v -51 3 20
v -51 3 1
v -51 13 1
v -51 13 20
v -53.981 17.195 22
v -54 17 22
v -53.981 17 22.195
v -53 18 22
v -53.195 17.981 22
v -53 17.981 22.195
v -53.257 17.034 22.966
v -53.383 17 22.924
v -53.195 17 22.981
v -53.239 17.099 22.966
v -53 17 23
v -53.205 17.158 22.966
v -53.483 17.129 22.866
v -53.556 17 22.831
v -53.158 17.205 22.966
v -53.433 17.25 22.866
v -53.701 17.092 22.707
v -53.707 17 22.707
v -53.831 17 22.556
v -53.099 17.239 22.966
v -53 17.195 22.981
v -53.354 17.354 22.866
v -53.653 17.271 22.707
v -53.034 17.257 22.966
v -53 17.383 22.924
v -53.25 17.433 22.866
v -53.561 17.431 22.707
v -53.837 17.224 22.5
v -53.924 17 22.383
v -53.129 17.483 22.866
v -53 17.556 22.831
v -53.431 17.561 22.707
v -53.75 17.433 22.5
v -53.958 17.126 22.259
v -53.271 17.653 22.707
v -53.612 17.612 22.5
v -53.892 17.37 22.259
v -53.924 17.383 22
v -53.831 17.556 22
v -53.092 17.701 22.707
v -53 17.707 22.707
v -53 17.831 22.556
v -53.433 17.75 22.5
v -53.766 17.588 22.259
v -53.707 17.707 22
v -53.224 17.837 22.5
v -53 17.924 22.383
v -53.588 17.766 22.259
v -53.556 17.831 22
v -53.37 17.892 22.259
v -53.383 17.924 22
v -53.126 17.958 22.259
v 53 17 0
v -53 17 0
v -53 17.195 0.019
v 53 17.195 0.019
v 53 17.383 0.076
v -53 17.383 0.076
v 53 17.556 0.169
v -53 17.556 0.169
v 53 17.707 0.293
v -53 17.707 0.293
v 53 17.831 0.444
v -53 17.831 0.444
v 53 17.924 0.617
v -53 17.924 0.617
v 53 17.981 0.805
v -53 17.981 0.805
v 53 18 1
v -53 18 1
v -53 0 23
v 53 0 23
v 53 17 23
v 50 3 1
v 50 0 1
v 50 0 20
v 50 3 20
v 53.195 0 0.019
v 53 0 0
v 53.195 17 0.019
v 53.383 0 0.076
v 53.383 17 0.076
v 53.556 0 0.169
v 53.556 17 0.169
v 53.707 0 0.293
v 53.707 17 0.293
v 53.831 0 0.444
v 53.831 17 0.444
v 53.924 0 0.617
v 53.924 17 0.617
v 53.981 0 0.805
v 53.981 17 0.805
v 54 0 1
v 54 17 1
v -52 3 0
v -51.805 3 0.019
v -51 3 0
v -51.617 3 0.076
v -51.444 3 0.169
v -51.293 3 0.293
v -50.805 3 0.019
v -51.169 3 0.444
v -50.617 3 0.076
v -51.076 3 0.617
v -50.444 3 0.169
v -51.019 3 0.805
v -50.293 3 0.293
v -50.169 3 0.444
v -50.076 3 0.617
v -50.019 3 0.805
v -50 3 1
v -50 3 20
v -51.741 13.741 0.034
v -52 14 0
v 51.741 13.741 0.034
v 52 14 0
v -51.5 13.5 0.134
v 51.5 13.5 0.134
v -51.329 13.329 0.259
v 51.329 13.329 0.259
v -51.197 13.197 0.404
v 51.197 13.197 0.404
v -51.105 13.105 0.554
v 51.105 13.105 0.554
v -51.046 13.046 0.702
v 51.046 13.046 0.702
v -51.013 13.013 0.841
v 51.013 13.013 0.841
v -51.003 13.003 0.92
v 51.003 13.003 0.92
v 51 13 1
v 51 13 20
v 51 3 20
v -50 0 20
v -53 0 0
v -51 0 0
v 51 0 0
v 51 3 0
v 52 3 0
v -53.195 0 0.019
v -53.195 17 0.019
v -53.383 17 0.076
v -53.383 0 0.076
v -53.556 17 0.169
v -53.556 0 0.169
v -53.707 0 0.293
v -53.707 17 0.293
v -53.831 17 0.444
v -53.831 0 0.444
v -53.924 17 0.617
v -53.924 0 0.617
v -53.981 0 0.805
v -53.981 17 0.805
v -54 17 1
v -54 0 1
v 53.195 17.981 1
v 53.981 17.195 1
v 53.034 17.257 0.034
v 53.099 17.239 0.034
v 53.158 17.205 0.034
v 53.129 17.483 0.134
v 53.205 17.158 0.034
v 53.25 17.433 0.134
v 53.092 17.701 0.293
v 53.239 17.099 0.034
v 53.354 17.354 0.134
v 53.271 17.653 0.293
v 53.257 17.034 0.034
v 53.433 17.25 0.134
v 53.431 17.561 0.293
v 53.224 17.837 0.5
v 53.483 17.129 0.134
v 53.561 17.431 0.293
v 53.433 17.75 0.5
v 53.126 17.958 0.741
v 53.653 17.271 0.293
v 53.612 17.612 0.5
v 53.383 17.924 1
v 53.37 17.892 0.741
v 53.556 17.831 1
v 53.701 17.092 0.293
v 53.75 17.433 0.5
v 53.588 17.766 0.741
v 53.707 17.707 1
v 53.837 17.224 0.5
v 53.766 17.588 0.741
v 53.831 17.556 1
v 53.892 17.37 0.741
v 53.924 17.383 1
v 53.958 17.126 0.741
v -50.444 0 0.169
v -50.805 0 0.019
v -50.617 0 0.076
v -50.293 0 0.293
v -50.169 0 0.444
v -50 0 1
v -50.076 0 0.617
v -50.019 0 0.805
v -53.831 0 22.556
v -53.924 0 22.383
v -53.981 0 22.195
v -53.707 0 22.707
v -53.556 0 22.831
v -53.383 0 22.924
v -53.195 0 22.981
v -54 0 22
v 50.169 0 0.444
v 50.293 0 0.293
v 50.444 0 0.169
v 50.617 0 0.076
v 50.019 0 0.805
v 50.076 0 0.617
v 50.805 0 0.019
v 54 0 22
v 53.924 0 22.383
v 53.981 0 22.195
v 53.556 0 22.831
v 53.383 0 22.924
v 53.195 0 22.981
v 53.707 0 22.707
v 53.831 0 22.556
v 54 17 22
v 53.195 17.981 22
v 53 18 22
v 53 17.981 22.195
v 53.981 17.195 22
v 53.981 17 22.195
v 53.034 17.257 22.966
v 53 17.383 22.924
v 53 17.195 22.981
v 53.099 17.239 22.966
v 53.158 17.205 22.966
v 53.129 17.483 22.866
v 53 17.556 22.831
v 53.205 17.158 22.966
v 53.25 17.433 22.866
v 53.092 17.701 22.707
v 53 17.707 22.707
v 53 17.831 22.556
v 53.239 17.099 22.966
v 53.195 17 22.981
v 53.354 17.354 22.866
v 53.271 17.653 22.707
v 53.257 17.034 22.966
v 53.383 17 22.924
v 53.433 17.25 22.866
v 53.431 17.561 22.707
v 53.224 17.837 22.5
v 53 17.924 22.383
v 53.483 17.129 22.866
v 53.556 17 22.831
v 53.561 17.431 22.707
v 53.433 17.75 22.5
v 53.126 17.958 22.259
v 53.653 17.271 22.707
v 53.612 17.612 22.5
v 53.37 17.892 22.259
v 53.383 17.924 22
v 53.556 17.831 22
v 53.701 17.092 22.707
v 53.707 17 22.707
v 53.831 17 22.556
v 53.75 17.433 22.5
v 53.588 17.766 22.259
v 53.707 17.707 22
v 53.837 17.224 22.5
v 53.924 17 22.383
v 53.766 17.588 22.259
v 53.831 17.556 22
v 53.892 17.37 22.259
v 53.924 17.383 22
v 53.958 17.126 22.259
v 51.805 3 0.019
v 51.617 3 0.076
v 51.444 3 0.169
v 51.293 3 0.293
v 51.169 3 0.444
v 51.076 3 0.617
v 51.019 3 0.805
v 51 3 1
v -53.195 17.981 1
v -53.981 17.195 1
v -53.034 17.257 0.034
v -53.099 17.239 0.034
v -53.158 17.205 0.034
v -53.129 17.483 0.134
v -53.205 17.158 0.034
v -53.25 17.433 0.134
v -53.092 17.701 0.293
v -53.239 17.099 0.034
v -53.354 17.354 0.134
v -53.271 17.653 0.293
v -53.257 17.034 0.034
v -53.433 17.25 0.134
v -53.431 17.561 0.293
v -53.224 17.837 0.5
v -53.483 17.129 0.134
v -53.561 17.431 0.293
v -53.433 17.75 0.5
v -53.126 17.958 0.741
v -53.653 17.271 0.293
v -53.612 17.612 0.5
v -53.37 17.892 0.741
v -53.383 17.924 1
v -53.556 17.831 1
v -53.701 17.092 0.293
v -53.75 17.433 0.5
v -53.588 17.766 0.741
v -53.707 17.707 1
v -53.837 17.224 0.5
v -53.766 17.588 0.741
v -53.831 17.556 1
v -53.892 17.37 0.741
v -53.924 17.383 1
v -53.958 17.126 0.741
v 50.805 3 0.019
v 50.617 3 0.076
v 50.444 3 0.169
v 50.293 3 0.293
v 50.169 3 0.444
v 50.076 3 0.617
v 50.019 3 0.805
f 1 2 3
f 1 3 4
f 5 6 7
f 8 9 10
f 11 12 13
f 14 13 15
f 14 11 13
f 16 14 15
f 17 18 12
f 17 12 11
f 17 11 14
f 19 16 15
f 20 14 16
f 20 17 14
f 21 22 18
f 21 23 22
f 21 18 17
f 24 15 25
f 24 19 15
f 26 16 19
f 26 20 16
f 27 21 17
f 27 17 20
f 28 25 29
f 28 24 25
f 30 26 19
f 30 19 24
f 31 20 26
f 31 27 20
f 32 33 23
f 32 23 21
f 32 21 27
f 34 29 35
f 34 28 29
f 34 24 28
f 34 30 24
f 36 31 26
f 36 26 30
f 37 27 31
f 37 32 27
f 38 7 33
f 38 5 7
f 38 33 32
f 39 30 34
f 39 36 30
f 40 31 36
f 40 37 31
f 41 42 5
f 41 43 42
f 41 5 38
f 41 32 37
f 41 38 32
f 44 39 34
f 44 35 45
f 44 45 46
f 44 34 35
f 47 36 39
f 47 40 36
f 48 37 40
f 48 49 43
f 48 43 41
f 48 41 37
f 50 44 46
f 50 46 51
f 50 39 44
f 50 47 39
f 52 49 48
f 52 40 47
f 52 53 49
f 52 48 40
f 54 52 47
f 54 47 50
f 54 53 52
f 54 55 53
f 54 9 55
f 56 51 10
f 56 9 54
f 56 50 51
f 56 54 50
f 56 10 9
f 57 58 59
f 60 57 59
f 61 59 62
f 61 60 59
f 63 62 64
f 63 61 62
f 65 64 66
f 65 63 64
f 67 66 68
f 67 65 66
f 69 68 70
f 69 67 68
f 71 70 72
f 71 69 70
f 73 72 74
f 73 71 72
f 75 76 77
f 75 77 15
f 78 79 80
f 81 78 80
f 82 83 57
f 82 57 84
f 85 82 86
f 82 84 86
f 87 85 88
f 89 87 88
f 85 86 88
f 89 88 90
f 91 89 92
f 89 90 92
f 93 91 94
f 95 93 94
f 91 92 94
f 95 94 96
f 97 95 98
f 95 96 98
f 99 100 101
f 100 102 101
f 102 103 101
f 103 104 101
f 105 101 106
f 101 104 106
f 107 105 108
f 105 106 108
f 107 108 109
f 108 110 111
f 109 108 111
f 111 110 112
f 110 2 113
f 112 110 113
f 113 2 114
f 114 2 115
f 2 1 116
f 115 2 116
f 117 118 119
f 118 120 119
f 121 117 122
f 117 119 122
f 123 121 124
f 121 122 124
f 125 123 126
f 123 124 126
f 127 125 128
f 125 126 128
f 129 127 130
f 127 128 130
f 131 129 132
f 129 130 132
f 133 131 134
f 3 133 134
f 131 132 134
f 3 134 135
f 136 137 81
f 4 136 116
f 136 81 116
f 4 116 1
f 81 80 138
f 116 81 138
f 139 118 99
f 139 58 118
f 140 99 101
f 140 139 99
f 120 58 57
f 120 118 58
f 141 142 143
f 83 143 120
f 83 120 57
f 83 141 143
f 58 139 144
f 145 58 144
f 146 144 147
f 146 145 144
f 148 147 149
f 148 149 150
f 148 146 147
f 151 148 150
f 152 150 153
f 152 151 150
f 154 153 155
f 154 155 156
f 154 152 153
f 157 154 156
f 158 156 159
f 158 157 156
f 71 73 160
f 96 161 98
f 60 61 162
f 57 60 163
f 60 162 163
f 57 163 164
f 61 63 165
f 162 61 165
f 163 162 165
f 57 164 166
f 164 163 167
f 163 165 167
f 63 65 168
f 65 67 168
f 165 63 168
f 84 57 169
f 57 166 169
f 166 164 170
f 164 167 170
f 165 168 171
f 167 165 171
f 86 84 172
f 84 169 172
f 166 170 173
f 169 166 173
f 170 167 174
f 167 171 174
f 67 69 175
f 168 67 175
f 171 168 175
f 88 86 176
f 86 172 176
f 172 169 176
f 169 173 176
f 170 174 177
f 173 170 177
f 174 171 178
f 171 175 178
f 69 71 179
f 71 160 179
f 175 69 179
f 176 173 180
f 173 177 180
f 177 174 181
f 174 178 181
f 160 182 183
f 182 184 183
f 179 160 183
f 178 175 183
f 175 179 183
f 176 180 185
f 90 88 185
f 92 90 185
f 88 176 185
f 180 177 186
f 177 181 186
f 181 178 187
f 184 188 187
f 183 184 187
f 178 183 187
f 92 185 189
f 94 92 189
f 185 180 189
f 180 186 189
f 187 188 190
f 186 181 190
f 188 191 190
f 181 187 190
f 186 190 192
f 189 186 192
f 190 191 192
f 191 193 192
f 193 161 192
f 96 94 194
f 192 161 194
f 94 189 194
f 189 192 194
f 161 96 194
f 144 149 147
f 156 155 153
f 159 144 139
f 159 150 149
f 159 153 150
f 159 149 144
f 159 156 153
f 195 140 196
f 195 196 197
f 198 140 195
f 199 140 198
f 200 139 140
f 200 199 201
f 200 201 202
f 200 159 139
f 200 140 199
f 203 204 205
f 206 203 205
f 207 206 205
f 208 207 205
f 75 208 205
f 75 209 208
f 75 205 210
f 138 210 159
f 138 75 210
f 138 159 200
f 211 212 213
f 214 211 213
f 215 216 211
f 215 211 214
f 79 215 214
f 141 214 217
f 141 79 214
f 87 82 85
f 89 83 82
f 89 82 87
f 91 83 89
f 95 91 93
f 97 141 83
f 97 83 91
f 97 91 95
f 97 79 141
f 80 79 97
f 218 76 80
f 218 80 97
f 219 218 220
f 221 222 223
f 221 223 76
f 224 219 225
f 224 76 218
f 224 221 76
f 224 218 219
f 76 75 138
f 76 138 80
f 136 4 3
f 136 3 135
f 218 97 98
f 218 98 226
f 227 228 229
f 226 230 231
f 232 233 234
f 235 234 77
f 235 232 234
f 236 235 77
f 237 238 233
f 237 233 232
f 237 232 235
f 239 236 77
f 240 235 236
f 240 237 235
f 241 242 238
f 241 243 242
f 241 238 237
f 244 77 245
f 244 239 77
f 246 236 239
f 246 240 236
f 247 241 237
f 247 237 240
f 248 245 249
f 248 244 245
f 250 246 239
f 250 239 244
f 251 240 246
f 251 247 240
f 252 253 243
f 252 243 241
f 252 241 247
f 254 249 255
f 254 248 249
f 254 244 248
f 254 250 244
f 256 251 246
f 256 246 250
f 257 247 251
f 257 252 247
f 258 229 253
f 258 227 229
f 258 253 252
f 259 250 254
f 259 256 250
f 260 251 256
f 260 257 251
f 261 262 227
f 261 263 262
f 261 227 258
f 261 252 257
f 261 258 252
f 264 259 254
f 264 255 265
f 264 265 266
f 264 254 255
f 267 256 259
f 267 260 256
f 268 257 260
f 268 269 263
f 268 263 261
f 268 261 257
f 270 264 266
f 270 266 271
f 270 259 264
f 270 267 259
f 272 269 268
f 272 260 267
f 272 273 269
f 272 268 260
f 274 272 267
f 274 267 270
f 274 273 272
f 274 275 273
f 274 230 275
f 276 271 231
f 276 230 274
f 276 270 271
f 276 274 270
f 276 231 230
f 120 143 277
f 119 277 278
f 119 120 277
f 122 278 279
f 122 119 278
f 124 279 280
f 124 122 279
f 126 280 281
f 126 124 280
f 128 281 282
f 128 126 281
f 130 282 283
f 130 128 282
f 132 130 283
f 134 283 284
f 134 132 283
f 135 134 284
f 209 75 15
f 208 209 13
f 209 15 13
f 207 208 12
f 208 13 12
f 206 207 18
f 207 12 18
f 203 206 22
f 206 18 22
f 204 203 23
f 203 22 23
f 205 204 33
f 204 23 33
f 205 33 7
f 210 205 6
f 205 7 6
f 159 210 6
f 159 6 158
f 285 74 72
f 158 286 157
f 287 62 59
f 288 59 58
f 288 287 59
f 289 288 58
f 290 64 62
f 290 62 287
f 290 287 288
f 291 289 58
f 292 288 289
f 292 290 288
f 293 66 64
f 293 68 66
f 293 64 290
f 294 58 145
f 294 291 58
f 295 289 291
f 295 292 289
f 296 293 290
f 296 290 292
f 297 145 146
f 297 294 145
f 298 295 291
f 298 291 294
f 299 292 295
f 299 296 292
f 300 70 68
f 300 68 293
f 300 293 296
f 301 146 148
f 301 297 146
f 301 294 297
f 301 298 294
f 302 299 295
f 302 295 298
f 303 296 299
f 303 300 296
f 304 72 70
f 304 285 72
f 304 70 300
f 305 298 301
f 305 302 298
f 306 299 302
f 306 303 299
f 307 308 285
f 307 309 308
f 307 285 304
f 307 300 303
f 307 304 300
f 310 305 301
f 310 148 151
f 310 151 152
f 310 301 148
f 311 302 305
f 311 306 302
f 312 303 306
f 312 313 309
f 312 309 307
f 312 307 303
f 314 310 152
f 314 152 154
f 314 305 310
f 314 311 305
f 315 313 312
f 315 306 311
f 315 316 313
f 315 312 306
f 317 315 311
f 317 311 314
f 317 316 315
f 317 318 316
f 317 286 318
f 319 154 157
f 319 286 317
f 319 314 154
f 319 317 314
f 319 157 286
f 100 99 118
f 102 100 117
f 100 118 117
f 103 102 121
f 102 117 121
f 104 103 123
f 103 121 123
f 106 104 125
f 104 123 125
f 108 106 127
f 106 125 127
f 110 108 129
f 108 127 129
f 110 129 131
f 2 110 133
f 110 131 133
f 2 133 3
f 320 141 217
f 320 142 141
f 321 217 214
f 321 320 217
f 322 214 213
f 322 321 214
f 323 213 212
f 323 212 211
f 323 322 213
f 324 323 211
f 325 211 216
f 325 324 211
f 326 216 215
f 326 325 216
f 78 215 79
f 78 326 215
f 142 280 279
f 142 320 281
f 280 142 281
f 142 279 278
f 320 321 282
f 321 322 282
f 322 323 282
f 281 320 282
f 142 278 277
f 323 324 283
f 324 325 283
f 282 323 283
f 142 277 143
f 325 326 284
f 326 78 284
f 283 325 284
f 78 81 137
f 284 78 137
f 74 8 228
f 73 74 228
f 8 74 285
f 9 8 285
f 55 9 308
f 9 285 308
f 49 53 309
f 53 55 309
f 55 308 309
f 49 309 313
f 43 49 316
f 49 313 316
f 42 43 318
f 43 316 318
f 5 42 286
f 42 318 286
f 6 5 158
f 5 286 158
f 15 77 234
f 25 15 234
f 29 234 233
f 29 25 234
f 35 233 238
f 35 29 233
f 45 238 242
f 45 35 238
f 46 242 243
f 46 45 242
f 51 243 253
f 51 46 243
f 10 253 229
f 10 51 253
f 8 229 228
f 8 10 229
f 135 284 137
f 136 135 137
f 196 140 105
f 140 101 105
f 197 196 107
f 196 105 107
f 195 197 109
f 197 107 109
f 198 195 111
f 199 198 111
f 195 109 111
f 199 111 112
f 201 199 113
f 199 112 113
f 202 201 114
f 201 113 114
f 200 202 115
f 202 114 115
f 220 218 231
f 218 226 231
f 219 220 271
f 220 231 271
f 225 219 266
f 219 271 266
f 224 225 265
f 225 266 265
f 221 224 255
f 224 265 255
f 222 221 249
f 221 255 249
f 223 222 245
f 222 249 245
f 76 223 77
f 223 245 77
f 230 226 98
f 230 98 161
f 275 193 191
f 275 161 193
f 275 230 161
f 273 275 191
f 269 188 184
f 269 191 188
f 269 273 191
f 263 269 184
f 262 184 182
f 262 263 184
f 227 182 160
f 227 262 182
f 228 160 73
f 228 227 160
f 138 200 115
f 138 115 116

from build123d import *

# Parameters (mm, degrees)
F0_W     = 1
F0_H     = 20
F0_W_2   = 100
F1_DEPTH = 18
F2_DEPTH = 13
F3_DEPTH = 3
F4_R     = 0.9999


# Not quite as in the source:
# - a fillet or chamfer is up to 0.001 mm smaller than in the source, because OpenCascade refuses the exact size


with BuildPart() as f1:
    # F0 (on Front) → F1 (new body)
    with BuildSketch(Plane.XZ):
        Polygon((51, 20), (51, 0), (54, 0), (54, 23), (-54, 23), (-54, 0), (-51, 0), (-51, 20), (-50, 20), (50, 20), align=None)
        with Locations((-50.5, 10)):
            Rectangle(F0_W, F0_H)
        with Locations((0, 10)):
            Rectangle(F0_W_2, F0_H)
        with Locations((50.5, 10)):
            Rectangle(F0_W, F0_H)
    extrude(amount=-F1_DEPTH)

    # F0 (on Front) → F2 (cut)
    with BuildSketch(Plane.XZ):
        with Locations((-50.5, 10)):
            Rectangle(F0_W, F0_H)
        with Locations((0, 10)):
            Rectangle(F0_W_2, F0_H)
        with Locations((50.5, 10)):
            Rectangle(F0_W, F0_H)
    extrude(amount=-F2_DEPTH, mode=Mode.SUBTRACT)

    # F0 (on Front) → F3 (join)
    with BuildSketch(Plane.XZ):
        with Locations((-50.5, 10)):
            Rectangle(F0_W, F0_H)
        with Locations((50.5, 10)):
            Rectangle(F0_W, F0_H)
    extrude(amount=-F3_DEPTH)

    # F4 (radius 1 in the source; OpenCascade refuses exactly that, so slightly less here)
    f4_edges = [f1.edges().sort_by_distance(p)[0] for p in [
        (-54, 18, 11.5),
        (54, 18, 11.5),
        (0, 18, 0),
        (54, 9, 0),
        (-54, 9, 0),
        (-54, 9, 23),
        (0, 18, 23),
        (54, 9, 23),
        (0, 13, 0),
        (51, 8, 0),
        (-51, 8, 0),
        (-50, 1.5, 0),
        (50, 1.5, 0),
    ]]
    fillet(f4_edges, radius=F4_R)


solid = f1.part
